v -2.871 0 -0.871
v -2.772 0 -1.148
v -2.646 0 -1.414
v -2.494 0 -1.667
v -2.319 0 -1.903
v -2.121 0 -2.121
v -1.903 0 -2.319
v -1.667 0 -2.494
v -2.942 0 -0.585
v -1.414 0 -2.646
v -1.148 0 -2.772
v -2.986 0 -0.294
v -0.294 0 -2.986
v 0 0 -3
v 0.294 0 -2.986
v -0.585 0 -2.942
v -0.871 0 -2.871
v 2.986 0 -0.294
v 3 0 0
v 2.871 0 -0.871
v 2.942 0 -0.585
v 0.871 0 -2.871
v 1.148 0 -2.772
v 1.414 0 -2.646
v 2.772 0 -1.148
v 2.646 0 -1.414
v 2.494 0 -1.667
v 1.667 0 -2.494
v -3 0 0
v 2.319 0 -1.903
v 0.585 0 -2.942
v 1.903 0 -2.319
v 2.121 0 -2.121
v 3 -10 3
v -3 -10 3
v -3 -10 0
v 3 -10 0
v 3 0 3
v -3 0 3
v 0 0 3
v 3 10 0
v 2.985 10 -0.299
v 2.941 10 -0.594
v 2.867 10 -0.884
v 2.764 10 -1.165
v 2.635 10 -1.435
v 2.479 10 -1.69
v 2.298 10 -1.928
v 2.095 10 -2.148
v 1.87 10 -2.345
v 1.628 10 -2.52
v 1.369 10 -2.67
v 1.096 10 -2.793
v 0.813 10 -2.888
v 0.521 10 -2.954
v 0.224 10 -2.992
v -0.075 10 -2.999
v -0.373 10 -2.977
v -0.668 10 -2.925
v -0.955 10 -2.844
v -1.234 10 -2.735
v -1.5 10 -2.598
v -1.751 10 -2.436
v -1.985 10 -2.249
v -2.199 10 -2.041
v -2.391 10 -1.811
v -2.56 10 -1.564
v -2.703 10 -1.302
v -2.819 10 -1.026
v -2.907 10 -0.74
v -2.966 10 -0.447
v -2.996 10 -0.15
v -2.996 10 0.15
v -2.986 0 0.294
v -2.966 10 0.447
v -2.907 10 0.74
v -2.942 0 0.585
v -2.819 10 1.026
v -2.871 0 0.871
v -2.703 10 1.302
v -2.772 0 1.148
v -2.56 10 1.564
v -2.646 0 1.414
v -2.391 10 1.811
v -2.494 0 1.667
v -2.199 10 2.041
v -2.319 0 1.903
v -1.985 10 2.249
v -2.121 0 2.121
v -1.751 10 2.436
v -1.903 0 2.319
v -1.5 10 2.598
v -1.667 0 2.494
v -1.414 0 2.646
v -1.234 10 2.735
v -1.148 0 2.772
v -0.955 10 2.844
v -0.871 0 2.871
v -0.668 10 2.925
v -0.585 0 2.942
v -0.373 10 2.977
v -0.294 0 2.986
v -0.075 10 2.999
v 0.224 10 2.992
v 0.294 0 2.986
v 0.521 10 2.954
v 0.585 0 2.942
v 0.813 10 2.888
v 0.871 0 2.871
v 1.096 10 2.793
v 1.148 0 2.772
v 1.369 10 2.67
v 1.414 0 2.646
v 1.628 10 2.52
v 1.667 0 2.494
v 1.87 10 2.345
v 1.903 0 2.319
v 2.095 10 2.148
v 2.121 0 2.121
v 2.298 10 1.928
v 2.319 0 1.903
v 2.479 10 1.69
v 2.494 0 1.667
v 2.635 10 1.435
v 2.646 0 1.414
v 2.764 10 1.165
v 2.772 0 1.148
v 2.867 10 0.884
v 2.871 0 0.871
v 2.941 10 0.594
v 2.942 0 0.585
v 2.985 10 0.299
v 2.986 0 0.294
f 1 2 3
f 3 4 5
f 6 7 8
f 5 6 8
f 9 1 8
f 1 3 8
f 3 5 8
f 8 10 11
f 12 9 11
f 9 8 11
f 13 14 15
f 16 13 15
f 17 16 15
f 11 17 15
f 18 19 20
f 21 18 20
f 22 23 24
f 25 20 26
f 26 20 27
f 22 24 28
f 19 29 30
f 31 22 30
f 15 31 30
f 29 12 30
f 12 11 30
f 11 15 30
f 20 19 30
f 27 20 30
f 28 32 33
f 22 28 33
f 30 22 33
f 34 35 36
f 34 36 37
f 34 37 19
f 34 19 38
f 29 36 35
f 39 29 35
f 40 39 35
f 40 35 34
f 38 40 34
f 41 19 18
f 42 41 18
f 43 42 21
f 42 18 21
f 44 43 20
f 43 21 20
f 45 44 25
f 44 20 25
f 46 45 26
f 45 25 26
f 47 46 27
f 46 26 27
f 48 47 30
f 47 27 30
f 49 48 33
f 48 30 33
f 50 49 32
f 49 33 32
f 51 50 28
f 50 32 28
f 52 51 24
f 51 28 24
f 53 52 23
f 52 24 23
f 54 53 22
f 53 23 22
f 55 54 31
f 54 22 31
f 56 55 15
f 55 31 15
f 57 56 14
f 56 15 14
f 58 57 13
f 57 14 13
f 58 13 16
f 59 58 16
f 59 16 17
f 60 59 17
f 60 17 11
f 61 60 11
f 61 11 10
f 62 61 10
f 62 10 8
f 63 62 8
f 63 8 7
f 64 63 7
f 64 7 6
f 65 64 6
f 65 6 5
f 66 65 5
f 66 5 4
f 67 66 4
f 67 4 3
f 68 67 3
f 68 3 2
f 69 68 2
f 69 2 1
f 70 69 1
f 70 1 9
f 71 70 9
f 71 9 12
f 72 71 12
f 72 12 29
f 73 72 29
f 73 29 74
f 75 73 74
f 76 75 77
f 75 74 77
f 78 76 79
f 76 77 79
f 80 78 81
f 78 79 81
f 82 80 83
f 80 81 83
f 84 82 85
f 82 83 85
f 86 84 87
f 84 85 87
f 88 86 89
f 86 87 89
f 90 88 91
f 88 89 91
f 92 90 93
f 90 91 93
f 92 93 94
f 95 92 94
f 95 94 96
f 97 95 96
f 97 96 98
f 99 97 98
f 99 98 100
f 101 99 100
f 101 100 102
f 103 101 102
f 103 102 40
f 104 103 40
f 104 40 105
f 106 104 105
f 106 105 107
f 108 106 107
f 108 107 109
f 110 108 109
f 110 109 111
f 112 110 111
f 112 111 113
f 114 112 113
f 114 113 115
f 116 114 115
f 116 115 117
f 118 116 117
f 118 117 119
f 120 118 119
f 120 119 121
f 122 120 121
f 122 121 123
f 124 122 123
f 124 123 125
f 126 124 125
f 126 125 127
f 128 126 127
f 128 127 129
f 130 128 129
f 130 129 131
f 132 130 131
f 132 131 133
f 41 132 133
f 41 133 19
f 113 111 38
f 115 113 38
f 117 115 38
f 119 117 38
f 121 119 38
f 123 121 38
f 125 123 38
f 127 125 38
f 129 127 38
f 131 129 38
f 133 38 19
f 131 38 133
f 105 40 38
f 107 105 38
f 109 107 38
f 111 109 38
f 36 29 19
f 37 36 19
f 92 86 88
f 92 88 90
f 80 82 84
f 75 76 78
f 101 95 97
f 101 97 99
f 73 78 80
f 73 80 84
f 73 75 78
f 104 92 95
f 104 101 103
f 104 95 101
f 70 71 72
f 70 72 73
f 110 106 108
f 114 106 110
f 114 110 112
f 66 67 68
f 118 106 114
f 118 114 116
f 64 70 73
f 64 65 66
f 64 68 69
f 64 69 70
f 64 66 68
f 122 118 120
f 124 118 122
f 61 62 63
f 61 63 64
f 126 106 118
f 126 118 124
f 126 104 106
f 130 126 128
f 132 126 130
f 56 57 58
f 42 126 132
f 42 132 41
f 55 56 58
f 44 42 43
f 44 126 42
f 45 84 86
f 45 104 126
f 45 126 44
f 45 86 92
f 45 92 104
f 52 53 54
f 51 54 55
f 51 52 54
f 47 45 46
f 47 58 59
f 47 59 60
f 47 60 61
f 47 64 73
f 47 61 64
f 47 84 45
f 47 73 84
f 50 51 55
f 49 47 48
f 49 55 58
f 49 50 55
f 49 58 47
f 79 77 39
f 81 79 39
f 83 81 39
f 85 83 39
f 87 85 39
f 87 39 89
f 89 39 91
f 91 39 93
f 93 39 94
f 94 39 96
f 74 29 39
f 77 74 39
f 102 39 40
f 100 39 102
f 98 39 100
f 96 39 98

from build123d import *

# Parameters (mm, degrees)
ESBO_O1_R                = 3
RESSALTO_EXTRUS_O1_DEPTH = 10
ESBO_O2_W                = 6
ESBO_O2_H                = 3
RESSALTO_EXTRUS_O2_DEPTH = 10


with BuildPart() as part:
    # Esboço1 → Ressalto-extrusão1 (new body)
    with BuildSketch(Plane(origin=(0, 0, 0), x_dir=(1, 0, 0), z_dir=(0, 1, 0))):
        Circle(ESBO_O1_R)
    extrude(amount=RESSALTO_EXTRUS_O1_DEPTH)

    # Esboço2 → Ressalto-extrusão2 (add)
    with BuildSketch(Plane.XZ):
        with Locations((0, 1.5)):
            Rectangle(ESBO_O2_W, ESBO_O2_H)
    extrude(amount=RESSALTO_EXTRUS_O2_DEPTH)


solid = part.part
